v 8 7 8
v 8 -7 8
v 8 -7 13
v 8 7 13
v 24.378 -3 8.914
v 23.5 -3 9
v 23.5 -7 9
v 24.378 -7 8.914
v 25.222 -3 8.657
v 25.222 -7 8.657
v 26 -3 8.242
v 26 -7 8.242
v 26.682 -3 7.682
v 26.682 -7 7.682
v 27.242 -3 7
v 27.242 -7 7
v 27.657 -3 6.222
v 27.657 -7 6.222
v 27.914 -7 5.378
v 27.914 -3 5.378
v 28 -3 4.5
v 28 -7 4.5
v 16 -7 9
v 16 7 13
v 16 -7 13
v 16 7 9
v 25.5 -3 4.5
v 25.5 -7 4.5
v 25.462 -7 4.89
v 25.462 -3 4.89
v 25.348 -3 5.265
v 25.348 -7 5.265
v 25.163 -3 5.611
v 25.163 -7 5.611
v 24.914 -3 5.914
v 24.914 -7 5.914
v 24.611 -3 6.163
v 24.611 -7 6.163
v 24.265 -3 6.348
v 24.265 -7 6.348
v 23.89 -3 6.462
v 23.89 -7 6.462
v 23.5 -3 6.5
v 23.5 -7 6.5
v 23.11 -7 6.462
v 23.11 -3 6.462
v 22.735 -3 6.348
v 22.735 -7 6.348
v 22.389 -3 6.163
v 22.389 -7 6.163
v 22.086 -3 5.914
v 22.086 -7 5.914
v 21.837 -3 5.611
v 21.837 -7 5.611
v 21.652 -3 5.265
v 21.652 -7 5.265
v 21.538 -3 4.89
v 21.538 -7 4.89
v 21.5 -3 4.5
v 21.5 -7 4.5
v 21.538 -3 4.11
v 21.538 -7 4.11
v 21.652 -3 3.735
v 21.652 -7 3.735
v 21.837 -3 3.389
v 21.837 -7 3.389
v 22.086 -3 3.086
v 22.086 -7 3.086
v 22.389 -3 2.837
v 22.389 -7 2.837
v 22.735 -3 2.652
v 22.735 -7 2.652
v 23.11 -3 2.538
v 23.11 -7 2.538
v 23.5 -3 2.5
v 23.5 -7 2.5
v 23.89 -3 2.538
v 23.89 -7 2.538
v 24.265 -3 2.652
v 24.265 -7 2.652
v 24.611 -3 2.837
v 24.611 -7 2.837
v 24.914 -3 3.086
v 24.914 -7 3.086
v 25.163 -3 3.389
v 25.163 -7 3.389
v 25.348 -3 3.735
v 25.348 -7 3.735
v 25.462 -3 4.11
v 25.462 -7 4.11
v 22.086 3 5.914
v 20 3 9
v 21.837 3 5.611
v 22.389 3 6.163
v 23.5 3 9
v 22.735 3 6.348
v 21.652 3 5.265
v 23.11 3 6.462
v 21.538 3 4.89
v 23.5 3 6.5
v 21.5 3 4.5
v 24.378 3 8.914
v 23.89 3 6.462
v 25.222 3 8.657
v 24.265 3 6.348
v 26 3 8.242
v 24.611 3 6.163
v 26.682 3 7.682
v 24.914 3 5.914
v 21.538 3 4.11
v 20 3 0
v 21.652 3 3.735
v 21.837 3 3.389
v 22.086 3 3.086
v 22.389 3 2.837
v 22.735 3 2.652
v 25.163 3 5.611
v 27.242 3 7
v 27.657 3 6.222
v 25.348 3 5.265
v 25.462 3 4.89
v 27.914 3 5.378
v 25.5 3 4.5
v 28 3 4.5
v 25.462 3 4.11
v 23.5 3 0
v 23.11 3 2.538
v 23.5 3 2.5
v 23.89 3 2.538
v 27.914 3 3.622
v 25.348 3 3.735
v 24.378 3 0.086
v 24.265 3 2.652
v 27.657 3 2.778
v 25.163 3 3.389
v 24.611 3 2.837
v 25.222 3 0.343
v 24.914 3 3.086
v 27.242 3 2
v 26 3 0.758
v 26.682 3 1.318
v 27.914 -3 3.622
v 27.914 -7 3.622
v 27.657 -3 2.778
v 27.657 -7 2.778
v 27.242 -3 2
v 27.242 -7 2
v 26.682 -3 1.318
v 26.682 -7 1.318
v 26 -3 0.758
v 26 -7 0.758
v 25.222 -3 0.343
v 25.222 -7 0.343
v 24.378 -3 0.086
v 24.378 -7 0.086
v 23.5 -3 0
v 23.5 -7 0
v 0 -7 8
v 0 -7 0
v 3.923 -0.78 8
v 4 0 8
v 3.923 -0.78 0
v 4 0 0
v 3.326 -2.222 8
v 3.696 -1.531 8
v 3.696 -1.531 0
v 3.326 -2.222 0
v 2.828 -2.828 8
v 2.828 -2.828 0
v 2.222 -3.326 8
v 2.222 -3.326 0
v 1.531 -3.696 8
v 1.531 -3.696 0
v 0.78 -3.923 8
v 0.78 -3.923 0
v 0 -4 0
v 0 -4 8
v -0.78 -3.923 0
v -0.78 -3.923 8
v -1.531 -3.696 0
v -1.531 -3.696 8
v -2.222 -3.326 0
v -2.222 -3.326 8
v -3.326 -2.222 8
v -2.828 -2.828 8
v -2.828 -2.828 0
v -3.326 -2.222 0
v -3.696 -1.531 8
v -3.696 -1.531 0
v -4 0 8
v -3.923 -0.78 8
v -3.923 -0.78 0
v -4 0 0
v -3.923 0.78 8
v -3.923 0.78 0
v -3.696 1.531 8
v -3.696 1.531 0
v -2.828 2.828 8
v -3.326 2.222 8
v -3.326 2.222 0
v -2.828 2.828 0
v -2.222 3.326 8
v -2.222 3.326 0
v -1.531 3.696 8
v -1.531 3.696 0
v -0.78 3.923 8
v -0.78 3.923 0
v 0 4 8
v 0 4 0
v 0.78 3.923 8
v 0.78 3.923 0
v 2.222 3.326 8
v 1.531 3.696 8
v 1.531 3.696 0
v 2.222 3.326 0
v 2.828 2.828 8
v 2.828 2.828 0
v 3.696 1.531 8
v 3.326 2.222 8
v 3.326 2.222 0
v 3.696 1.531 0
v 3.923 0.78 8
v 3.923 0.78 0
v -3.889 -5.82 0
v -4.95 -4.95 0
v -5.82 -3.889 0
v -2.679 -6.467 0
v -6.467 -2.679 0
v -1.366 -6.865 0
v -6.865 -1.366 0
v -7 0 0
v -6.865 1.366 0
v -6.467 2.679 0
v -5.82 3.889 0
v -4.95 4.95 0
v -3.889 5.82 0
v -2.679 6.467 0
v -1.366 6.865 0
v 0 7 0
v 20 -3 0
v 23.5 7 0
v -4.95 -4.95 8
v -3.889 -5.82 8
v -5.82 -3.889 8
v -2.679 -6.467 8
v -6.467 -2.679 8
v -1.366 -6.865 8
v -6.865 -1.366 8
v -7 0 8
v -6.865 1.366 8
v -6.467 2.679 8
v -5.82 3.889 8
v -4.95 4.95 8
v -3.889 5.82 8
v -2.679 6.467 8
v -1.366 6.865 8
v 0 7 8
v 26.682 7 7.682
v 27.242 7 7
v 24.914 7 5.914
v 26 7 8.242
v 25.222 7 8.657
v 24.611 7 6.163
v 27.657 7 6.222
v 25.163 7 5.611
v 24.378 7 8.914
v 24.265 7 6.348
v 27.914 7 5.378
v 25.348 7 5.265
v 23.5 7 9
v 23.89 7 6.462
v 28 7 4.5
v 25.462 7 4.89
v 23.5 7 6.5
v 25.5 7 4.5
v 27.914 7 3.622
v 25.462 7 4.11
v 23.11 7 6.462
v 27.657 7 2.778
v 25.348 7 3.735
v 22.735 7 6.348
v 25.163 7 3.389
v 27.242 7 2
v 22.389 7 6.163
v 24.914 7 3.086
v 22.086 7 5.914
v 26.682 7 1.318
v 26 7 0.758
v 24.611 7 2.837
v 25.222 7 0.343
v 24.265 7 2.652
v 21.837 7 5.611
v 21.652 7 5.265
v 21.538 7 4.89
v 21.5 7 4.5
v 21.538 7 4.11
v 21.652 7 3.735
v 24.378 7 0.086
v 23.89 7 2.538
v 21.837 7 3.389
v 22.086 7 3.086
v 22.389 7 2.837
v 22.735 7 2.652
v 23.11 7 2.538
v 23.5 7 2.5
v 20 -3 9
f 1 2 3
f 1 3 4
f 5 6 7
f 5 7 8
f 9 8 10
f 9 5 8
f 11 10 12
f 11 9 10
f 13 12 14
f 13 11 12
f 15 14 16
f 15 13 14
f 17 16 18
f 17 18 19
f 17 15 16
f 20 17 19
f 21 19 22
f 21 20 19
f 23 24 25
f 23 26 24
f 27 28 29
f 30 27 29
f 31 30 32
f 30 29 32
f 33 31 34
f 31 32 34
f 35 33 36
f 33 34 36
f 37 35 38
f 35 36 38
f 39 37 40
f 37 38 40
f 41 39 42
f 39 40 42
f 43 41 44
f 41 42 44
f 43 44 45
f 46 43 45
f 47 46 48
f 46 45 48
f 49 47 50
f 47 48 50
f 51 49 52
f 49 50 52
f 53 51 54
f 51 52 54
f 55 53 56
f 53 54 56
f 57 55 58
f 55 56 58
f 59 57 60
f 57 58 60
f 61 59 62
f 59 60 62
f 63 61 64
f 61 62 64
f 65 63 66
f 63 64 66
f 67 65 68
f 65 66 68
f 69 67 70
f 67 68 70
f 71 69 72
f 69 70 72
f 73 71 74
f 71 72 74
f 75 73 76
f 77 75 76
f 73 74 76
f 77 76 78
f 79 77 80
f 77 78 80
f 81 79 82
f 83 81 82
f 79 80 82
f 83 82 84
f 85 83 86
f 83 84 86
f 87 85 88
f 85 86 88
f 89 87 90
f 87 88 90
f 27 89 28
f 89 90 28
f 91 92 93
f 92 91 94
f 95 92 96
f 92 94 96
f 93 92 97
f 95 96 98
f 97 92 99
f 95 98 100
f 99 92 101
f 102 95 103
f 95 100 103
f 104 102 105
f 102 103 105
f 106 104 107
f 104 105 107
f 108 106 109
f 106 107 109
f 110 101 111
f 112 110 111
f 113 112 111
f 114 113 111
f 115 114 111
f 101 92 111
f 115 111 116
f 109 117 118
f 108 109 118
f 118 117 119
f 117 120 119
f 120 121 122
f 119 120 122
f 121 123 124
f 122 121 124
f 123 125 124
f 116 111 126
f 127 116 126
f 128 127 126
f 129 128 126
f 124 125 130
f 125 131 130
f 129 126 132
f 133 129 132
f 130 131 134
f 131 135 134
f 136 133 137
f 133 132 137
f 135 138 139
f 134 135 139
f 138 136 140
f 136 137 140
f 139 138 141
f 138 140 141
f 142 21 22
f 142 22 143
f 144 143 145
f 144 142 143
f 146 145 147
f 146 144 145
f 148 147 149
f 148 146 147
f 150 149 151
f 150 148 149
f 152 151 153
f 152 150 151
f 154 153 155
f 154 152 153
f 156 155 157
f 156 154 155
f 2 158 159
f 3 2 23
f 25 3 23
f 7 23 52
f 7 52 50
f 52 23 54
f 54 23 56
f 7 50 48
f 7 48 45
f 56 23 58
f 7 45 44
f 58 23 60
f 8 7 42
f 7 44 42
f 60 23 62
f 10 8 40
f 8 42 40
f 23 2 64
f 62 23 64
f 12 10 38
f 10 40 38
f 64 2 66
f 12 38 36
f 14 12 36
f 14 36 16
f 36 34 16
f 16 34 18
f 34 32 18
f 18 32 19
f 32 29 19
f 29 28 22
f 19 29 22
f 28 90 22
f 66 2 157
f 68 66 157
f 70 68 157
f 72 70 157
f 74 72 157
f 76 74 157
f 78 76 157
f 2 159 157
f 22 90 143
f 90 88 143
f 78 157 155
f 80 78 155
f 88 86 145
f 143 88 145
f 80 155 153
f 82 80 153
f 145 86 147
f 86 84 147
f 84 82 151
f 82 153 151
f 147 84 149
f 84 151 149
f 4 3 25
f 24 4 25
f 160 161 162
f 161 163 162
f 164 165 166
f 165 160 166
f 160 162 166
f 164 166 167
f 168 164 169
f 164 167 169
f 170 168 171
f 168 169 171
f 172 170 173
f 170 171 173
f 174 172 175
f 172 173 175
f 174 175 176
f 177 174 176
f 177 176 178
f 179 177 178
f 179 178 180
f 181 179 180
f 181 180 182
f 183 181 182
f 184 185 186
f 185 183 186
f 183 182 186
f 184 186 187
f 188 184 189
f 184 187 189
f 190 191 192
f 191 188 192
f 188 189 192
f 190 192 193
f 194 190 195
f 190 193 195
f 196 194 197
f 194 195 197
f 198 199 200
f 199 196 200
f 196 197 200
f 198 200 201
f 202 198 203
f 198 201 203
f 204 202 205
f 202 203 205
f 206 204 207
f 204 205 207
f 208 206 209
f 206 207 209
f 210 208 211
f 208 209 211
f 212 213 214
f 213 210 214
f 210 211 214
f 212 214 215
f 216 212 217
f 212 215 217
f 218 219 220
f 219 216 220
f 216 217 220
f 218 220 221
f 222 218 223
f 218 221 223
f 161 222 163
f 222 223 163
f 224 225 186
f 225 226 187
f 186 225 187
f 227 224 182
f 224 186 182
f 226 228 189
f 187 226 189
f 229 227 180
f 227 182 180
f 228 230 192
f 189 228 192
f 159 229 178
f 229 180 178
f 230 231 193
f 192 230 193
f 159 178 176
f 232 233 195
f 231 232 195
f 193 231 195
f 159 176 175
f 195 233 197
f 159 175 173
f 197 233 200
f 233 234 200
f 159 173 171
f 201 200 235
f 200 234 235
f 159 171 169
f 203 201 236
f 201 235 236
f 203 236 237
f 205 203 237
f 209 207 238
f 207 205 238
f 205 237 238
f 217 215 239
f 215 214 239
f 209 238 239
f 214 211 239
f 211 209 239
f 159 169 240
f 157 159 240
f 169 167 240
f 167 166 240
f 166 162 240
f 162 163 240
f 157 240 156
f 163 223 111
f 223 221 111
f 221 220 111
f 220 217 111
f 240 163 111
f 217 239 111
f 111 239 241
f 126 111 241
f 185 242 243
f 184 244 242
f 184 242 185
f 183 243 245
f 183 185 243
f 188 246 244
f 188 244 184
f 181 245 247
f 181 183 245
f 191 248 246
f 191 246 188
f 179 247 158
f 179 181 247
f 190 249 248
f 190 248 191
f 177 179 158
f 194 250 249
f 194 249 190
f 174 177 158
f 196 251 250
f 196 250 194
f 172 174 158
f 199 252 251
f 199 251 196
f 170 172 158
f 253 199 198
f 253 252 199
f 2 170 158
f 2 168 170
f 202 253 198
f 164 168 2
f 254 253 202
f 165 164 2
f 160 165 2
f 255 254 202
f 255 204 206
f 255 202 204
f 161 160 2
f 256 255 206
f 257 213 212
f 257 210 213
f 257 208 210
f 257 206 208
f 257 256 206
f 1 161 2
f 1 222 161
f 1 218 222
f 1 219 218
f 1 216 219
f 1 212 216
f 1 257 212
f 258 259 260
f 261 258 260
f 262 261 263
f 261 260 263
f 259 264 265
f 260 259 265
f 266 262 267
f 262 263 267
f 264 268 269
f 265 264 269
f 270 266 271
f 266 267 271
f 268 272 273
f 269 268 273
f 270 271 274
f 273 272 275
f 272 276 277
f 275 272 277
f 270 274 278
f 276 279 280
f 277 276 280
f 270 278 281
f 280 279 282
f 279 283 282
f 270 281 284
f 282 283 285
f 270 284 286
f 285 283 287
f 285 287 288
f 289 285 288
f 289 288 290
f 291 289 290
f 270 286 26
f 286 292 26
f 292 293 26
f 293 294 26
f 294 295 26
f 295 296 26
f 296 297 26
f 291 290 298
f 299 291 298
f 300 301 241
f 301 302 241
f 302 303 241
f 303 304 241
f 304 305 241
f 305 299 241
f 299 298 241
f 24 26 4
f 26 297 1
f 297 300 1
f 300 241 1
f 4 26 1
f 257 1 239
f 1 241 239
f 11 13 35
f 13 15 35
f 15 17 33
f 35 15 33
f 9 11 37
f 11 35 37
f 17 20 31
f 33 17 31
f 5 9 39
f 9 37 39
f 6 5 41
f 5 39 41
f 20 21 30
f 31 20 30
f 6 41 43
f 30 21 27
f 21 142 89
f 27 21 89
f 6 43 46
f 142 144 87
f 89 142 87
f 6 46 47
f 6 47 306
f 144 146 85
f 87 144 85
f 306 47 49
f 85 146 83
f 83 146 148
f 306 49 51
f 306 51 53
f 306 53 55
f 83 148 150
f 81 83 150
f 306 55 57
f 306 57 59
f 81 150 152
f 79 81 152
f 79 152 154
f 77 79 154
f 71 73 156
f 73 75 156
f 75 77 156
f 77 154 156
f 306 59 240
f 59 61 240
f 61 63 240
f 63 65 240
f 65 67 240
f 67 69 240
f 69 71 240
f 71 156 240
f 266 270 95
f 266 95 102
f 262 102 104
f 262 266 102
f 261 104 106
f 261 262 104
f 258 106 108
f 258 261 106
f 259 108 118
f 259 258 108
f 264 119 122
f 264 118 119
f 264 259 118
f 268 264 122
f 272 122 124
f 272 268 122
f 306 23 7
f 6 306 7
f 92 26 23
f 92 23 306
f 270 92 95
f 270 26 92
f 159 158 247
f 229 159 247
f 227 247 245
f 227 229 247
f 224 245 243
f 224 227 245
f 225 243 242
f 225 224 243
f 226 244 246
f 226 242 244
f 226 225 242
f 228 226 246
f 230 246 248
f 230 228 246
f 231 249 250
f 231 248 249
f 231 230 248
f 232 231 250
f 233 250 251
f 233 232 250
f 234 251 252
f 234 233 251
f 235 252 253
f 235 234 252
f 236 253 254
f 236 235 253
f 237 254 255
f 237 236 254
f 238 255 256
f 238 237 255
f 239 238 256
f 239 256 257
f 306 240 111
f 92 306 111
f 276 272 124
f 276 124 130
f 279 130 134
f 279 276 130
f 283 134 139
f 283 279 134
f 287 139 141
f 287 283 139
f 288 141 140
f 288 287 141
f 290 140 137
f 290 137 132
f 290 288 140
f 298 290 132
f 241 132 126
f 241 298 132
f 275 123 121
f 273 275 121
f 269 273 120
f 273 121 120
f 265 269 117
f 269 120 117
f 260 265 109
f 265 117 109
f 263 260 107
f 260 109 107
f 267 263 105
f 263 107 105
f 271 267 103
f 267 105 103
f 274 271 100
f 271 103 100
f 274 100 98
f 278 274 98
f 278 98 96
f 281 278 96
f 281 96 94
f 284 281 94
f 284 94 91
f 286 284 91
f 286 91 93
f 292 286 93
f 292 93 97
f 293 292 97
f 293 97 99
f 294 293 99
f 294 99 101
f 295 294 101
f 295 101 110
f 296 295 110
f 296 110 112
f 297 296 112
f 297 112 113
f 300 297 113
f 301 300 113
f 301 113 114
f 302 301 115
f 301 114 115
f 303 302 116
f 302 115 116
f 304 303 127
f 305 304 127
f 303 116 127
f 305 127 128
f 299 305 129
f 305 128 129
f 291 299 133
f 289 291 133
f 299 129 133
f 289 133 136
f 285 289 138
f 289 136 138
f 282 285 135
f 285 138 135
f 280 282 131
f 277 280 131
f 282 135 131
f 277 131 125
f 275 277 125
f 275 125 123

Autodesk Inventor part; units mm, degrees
ref_plane "YZ Plane" through (0, 0, 0) normal (1, 0, 0) x (0, 1, 0)
ref_plane "XZ Plane" through (0, 0, 0) normal (0, 1, 0) x (-1, 0, 0)
ref_plane "XY Plane" through (0, 0, 0) normal (0, 0, 1) x (1, 0, 0)
sketch "Náčrt1" plane through (0, 0, 0) normal (0, 0, 1) x (1, 0, 0)
  circle A0 centre (0, 0) radius 4
  arc A1 (0, 7) -> (0, -7) centre (0, 0) ccw
  line L0 (0, -9.8) -> (0, 9.8) construction
  line L1 (-14, 0) -> (35, 0) construction
  line L2 (0, -7) -> (28, -7)
  line L3 (28, -7) -> (28, -3)
  line L4 (28, -3) -> (20, -3)
  line L5 (20, -3) -> (20, 3)
  line L6 (20, 3) -> (28, 3)
  line L7 (28, 3) -> (28, 7)
  line L8 (28, 7) -> (0, 7)
  dimension "d0" = 8
  dimension "d1" = 14
  dimension "d2" = 4
  dimension "d3" = 4
  dimension "d4" = 6
  dimension "d5" = 8
  dimension "d6" = 28
extrude "Vysunutí1" add sketch "Náčrt1" along normal blind 8
sketch "Náčrt2" plane through (0, 0, 8) normal (0, 0, 1) x (1, 0, 0)
  line L0 (-14, 0) -> (35, 0) construction
  line L1 (0, -9.8) -> (0, 9.8) construction
  line L2 (8, 7) -> (16, 7)
  line L3 (16, 7) -> (16, -7)
  line L4 (16, -7) -> (8, -7)
  line L5 (8, -7) -> (8, 7)
  point P0 (0, 0)
  dimension "d10" = 8
  dimension "d11" = 8
  dimension "d12" = 7
  dimension "d13" = 7
extrude "Vysunutí2" add sketch "Náčrt2" along normal blind 5
sketch "Náčrt5" plane through (0, 0, 8) normal (0, 0, 1) x (1, 0, 0)
  line L0 (16, 7) -> (16, -7) projected
  line L1 (16, -7) -> (28, -7) projected
  line L2 (28, -7) -> (28, -3) projected
  line L3 (28, -3) -> (20, -3) projected
  line L4 (20, -3) -> (20, 3) projected
  line L5 (20, 3) -> (28, 3) projected
  line L6 (28, 3) -> (28, 7) projected
  line L7 (28, 7) -> (16, 7) projected
  point P0 (0, 0)
extrude "Vysunutí4" add sketch "Náčrt5" along normal blind 1
sketch "Náčrt6" plane through (0, -7, 0) normal (0, -1, 0) x (1, 0, 0)
  point P0 (0, 0)
fillet "Zaoblení2" radius 4.5 4 edges at (28, -5, 9) (28, -5, 0) (28, 5, 0) (28, 5, 9)
sketch "Náčrt7" plane through (0, -7, 0) normal (0, -1, 0) x (1, 0, 0)
  arc A0 (23.5, 0) -> (23.5, 9) centre (23.5, 4.5) ccw construction
  circle A1 centre (23.5, 4.5) radius 2
  point P0 (0, 0)
  dimension "d22" = 4
extrude "Vysunutí5" cut sketch "Náčrt7" against normal through all
properties part number "Součást15"
